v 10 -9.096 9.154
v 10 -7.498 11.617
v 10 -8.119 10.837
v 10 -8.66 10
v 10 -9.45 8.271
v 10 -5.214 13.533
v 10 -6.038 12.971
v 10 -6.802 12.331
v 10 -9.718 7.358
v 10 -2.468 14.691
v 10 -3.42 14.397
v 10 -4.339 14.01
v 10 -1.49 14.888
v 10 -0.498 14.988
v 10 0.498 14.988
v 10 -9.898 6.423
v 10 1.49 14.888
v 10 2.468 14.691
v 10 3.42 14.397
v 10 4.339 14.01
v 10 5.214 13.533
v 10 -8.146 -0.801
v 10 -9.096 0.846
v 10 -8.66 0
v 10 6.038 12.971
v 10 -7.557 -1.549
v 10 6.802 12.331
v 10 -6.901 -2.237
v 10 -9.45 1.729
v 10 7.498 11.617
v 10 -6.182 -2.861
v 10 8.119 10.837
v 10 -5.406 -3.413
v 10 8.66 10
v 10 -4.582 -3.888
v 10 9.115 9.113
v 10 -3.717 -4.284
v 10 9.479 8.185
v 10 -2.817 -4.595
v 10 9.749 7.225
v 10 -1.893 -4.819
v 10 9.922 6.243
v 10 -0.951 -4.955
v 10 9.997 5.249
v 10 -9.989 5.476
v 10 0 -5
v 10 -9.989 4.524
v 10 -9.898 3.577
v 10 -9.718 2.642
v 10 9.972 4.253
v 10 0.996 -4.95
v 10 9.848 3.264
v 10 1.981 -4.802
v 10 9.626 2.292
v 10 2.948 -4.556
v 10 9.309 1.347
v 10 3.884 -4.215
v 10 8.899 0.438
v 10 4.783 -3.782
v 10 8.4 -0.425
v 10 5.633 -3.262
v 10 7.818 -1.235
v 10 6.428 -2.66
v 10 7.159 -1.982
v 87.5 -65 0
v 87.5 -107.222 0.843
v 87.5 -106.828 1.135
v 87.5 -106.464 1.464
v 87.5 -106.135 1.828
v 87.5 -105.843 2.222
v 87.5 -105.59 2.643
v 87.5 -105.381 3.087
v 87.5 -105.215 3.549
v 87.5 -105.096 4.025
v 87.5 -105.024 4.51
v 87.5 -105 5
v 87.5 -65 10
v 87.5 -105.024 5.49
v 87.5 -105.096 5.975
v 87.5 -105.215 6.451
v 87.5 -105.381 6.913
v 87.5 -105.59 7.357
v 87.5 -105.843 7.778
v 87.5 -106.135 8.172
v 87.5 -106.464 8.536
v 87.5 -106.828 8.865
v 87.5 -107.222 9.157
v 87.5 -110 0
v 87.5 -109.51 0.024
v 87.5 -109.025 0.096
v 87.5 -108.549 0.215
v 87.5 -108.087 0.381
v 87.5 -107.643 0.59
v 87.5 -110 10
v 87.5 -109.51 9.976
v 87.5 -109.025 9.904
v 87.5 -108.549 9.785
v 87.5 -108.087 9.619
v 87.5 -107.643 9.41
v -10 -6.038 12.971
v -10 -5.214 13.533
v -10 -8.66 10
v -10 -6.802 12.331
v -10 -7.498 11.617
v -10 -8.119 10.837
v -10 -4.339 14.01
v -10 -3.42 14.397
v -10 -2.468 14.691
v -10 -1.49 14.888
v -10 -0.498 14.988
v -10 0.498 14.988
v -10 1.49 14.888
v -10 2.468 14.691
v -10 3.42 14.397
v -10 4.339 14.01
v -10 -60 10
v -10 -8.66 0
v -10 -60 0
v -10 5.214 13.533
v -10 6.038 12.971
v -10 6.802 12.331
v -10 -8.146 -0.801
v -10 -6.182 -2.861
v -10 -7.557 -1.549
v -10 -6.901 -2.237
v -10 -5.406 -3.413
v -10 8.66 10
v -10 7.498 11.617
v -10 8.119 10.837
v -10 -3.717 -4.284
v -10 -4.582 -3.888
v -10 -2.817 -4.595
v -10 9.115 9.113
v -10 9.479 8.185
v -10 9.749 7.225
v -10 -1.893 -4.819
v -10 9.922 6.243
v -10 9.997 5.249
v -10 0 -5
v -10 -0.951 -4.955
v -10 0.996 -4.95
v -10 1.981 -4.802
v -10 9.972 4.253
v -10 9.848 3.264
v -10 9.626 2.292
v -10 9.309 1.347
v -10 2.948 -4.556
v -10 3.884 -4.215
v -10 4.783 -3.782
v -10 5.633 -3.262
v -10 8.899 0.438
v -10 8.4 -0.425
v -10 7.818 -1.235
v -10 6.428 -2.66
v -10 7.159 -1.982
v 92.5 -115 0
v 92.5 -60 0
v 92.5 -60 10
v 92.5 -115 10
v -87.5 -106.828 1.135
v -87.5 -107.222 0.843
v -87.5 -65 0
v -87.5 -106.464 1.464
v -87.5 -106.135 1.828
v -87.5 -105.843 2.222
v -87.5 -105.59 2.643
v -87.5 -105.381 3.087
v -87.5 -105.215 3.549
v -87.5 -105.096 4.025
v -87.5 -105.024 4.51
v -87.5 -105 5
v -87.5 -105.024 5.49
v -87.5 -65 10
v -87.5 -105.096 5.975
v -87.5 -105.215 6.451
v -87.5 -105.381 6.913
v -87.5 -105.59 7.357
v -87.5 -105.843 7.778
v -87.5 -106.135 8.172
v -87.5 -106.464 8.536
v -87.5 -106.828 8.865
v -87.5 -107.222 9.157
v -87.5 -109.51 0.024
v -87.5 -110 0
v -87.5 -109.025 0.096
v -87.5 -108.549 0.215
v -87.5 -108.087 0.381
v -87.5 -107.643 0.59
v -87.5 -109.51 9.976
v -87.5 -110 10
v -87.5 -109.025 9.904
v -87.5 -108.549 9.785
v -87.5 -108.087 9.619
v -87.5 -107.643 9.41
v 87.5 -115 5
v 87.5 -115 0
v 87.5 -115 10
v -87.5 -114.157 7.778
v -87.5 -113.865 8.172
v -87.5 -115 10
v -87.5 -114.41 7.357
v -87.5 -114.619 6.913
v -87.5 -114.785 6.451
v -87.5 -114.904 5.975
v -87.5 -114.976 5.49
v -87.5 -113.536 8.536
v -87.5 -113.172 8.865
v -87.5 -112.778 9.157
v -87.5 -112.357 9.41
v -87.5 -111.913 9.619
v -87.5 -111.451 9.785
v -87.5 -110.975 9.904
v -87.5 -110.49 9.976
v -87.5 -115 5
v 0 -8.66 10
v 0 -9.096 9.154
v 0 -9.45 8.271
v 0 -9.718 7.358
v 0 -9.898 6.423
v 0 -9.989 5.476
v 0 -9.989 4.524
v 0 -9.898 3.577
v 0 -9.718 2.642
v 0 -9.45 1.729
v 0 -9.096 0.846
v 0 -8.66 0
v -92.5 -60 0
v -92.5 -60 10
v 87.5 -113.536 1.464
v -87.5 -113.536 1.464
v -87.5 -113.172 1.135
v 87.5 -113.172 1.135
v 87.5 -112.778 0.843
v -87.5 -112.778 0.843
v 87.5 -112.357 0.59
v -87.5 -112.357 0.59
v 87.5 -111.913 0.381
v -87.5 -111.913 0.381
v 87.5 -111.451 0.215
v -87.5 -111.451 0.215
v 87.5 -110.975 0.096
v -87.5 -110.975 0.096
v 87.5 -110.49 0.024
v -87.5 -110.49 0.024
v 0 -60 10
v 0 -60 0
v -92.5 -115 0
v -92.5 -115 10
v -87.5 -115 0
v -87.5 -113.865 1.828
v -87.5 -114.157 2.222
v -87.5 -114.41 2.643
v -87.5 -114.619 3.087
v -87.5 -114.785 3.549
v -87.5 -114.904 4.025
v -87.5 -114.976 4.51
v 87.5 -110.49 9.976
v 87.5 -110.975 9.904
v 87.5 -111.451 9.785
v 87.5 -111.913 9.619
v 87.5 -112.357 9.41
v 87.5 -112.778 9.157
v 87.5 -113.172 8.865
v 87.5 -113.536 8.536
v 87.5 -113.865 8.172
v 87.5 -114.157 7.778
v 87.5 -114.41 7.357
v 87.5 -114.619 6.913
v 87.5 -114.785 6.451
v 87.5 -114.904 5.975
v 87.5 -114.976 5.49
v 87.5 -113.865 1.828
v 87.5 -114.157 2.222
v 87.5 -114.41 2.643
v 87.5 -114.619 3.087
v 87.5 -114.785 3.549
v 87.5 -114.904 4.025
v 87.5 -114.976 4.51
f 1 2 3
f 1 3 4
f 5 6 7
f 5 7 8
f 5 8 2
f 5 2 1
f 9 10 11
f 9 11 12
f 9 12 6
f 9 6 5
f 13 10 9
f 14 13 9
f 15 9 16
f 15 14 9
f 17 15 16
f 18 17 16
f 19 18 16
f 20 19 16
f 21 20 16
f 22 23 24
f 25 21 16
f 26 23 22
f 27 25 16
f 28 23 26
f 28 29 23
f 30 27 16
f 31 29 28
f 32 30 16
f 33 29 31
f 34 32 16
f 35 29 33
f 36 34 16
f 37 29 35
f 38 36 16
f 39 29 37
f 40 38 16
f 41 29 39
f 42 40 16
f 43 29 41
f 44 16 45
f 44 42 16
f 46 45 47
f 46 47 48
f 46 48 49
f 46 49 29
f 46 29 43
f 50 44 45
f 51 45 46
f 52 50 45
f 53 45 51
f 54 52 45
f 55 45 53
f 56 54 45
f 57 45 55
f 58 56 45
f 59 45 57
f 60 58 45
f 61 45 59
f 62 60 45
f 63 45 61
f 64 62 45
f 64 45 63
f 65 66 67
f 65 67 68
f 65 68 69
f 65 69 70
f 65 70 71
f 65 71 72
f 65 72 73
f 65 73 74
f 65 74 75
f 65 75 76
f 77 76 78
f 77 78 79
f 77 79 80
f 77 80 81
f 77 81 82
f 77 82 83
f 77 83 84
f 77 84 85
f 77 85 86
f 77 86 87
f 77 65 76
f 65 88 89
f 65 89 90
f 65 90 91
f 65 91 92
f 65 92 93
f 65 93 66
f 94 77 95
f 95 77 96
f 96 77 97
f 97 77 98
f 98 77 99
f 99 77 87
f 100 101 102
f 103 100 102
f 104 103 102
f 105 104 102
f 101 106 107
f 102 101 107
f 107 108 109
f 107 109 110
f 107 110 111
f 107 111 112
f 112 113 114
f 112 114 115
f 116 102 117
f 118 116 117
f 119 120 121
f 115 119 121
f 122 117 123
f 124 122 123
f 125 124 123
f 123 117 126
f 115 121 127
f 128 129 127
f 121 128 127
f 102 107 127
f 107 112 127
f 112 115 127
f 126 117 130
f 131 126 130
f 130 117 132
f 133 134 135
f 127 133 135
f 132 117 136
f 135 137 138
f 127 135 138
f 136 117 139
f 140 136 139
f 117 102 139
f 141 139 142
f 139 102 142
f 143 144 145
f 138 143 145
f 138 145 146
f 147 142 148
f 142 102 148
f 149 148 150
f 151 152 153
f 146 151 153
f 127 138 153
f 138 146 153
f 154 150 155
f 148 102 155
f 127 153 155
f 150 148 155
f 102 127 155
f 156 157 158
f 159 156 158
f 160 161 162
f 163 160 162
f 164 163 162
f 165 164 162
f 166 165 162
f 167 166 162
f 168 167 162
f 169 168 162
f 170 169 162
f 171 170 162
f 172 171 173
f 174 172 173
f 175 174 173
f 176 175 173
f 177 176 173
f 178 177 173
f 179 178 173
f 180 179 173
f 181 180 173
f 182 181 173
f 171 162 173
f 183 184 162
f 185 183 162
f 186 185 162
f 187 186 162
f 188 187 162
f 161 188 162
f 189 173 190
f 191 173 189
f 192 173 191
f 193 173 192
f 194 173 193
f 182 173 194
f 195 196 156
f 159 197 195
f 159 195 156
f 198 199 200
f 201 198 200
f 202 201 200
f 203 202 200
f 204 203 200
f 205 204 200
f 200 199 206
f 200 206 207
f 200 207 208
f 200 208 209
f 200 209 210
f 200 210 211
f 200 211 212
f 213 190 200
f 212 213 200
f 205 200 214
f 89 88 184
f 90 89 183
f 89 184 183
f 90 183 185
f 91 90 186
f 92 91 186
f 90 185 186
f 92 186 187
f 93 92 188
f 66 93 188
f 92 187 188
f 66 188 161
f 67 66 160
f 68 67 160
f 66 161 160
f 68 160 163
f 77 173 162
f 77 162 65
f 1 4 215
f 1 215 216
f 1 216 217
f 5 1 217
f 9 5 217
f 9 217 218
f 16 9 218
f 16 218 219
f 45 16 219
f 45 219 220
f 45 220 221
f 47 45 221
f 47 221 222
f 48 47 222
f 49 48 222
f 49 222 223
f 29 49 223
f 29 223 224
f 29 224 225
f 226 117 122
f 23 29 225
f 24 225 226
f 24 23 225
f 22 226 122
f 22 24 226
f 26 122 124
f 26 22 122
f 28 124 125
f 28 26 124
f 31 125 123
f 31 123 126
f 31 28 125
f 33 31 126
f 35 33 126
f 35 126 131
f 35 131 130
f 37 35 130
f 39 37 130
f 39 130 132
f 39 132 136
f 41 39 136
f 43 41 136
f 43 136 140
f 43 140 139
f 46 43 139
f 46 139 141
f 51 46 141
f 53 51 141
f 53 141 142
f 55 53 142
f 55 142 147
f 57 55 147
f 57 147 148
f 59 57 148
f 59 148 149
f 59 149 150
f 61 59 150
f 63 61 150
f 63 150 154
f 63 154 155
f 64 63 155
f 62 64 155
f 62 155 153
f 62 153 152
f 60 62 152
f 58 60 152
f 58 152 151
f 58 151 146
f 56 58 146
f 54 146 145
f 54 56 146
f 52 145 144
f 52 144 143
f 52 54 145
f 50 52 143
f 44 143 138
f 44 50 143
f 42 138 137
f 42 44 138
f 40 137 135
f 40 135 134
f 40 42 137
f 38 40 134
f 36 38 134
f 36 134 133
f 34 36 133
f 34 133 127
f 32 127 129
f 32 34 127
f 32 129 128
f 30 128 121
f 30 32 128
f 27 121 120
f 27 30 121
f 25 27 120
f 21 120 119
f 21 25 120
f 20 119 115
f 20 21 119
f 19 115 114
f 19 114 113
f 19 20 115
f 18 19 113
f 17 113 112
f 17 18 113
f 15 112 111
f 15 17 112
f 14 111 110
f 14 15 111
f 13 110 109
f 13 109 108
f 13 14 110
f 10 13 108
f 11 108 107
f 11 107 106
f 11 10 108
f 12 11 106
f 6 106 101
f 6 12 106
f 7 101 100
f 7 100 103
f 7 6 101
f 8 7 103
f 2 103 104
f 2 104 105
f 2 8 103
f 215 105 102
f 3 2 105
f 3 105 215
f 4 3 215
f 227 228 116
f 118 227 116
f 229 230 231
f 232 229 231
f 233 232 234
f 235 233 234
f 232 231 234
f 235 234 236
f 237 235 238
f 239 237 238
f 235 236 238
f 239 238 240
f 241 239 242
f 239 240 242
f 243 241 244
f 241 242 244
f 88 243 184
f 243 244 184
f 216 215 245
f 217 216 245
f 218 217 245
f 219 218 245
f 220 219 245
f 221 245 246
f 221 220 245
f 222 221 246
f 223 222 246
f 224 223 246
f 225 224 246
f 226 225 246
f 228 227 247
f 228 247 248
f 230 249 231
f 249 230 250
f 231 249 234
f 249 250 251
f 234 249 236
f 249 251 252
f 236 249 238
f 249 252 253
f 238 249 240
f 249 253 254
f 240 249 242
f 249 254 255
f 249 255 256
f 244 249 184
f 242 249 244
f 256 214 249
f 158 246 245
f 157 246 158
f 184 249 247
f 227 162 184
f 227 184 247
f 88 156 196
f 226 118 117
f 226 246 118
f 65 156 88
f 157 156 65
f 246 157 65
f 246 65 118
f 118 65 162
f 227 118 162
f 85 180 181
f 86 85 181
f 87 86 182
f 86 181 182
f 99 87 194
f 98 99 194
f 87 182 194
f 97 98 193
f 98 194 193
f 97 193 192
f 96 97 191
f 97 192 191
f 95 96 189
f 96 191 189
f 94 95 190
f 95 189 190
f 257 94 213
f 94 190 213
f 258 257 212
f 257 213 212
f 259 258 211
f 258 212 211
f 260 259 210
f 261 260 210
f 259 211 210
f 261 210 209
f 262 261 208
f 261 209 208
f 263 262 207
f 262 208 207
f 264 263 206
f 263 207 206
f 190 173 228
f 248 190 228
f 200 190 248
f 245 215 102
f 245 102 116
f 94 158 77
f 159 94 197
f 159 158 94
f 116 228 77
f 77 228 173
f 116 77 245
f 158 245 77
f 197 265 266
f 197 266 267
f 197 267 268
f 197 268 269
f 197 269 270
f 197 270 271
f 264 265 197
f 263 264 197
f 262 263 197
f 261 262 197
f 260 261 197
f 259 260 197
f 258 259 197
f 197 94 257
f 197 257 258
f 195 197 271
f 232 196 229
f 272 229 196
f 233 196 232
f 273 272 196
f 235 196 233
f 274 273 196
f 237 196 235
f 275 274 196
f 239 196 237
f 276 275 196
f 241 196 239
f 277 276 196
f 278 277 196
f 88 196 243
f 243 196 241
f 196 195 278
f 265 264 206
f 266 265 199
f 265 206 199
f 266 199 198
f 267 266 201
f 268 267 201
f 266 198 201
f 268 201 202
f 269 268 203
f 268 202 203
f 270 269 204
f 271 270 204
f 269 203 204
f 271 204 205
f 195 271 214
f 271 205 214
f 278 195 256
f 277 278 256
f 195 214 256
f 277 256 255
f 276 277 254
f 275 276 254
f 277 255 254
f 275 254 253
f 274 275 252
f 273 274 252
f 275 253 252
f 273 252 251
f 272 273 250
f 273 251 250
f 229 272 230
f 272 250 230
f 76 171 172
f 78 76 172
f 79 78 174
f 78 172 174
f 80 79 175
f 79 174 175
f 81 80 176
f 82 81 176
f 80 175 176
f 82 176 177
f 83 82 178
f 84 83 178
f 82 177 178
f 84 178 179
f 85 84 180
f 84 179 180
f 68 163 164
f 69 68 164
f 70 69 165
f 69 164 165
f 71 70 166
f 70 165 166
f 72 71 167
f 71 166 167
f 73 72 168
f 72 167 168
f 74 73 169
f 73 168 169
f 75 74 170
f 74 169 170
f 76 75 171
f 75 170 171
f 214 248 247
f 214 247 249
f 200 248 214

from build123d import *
from build123d.topology import SkipClean

# Parameters (mm, degrees)
EXTRUDE_1_DEPTH     = 10
EXTRUDE_START       = -10
EXTRUDE_2_DEPTH     = 10
SKETCH_2_W          = 5
SKETCH_2_H          = 10
EXTRUDE_6_DEPTH     = 55
EXTRUDE_6_2_DEPTH   = 55
SKETCH_2_5_W        = 180
SKETCH_2_5_H        = 10
EXTRUDE_7_DEPTH     = 5
SKETCH_5_R          = 5
EXTRUDE_8_DEPTH     = 175
CUT_EXTRUDE_1_DEPTH = 175
SKETCH_7_W          = 10
SKETCH_7_H          = 10
CUT_EXTRUDE_2_DEPTH = 50
EXTRUDE_9_DEPTH     = 10
SKETCH_8_3_R        = 10
EXTRUDE_10_DEPTH    = 10


with BuildPart() as part:
    # 草图1 → 凸台-拉伸1 (new body)
    with BuildSketch(Plane.XY):
        with BuildLine():
            Line((10, -60), (10, 0))
            ThreePointArc((10, 0), (0, 10), (-10, 0))
            Line((-10, 0), (-10, -60))
            Line((-10, -60), (10, -60))
        make_face()
    extrude(amount=EXTRUDE_1_DEPTH)

    # 草图1<4> → 凸台-拉伸2 (add)
    with BuildSketch(Plane.XY.offset(EXTRUDE_START)):
        with BuildLine():
            ThreePointArc((10, 0), (0, 10), (-10, 0))
            ThreePointArc((-10, 0), (0, -10), (10, 0))
        make_face()
    extrude(amount=EXTRUDE_2_DEPTH)



with BuildPart() as body_2:
    # 草图2 → 凸台-拉伸6 (new body)
    with BuildSketch(Plane.XZ.offset(60)):
        with Locations((-90, 5)):
            Rectangle(SKETCH_2_W, SKETCH_2_H)
    extrude(amount=EXTRUDE_6_DEPTH)


with BuildPart() as body_3:
    # 草图2 → Extrude 6 2 (new body)
    with BuildSketch(Plane.XZ.offset(60)):
        with Locations((90, 5)):
            Rectangle(SKETCH_2_W, SKETCH_2_H)
    extrude(amount=EXTRUDE_6_2_DEPTH)


with BuildPart() as part_1:
    add(part.part)

    add(body_2.part)  # 凸台-拉伸7 merges body 2

    add(body_3.part)  # 凸台-拉伸7 merges body 3
    # 草图2<5> → 凸台-拉伸7 (add)
    with BuildSketch(Plane.XZ.offset(60)):
        with Locations((-2.5, 5)):
            Rectangle(SKETCH_2_5_W, SKETCH_2_5_H)
    extrude(amount=EXTRUDE_7_DEPTH)

    # 草图5 → 凸台-拉伸8 (add)
    with BuildSketch(Plane(origin=(-87.5, 0, 0), x_dir=(0, 0, -1), z_dir=(1, 0, 0))):
        with Locations((-5, -110)):
            Circle(SKETCH_5_R)
    extrude(amount=EXTRUDE_8_DEPTH)

    # 草图6 → 切除-拉伸1 (cut)
    with BuildSketch(Plane(origin=(0, 0, -10), x_dir=(-1, 0, 0), z_dir=(0, 0, -1))):
        with BuildLine():
            ThreePointArc((10, 0), (7.071067812, -7.071067812), (0, -10))
            Line((0, -10), (10, -10))
            Line((10, -10), (10, 0))
        make_face()
        with BuildLine():
            Line((-10, -10), (0, -10))
            ThreePointArc((0, -10), (-7.071067812, -7.071067812), (-10, 0))
            Line((-10, 0), (-10, -10))
        make_face()
        with BuildLine():
            ThreePointArc((-2.7e-08, 10), (7.071067802, 7.071067821), (10, 0))
            Line((10, 0), (10, 10))
            Line((10, 10), (-2.7e-08, 10))
        make_face()
        with BuildLine():
            Line((-10, 10), (-10, 0))
            ThreePointArc((-10, 0), (-7.071067821, 7.071067802), (-2.7e-08, 10))
            Line((-2.7e-08, 10), (-10, 10))
        make_face()
    extrude(amount=-CUT_EXTRUDE_1_DEPTH, mode=Mode.SUBTRACT)


with BuildPart() as cut_extrude_1_kept_piece:
    # of the separate pieces the step leaves, the one the design keeps (cut_extrude_1_pieces_kept)
    add(part_1.part.solids().sort_by_distance((-87.5, -65, 0))[0])

    # 草图7 → 切除-拉伸2 (cut)
    with BuildSketch(Plane(origin=(0, -10, 0), x_dir=(1, 0, 0), z_dir=(0, 1, 0))):
        with Locations((5, -5)):
            Rectangle(SKETCH_7_W, SKETCH_7_H)
    extrude(amount=-CUT_EXTRUDE_2_DEPTH, mode=Mode.SUBTRACT)

    # 草图8 → 凸台-拉伸9 (add)
    with BuildSketch(Plane(origin=(0, 0, 0), x_dir=(0, 0, -1), z_dir=(1, 0, 0))):
        with BuildLine():
            Line((-10, -8.660254038), (-10, -10))
            Line((-10, -10), (0, -10))
            Line((0, -10), (0, -8.660254038))
            ThreePointArc((0, -8.660254038), (-5, 10), (-10, -8.660254038))
        make_face()
    extrude(amount=-EXTRUDE_9_DEPTH)

    # 草图8<3> → 凸台-拉伸10 (add)
    with SkipClean():  # the faces are left unmerged after this step: merging them gives an invalid solid
        with BuildSketch(Plane(origin=(0, 0, 0), x_dir=(0, 0, -1), z_dir=(1, 0, 0))):
            with Locations((-5, 0)):
                Circle(SKETCH_8_3_R)
        extrude(amount=EXTRUDE_10_DEPTH)


solid = cut_extrude_1_kept_piece.part
